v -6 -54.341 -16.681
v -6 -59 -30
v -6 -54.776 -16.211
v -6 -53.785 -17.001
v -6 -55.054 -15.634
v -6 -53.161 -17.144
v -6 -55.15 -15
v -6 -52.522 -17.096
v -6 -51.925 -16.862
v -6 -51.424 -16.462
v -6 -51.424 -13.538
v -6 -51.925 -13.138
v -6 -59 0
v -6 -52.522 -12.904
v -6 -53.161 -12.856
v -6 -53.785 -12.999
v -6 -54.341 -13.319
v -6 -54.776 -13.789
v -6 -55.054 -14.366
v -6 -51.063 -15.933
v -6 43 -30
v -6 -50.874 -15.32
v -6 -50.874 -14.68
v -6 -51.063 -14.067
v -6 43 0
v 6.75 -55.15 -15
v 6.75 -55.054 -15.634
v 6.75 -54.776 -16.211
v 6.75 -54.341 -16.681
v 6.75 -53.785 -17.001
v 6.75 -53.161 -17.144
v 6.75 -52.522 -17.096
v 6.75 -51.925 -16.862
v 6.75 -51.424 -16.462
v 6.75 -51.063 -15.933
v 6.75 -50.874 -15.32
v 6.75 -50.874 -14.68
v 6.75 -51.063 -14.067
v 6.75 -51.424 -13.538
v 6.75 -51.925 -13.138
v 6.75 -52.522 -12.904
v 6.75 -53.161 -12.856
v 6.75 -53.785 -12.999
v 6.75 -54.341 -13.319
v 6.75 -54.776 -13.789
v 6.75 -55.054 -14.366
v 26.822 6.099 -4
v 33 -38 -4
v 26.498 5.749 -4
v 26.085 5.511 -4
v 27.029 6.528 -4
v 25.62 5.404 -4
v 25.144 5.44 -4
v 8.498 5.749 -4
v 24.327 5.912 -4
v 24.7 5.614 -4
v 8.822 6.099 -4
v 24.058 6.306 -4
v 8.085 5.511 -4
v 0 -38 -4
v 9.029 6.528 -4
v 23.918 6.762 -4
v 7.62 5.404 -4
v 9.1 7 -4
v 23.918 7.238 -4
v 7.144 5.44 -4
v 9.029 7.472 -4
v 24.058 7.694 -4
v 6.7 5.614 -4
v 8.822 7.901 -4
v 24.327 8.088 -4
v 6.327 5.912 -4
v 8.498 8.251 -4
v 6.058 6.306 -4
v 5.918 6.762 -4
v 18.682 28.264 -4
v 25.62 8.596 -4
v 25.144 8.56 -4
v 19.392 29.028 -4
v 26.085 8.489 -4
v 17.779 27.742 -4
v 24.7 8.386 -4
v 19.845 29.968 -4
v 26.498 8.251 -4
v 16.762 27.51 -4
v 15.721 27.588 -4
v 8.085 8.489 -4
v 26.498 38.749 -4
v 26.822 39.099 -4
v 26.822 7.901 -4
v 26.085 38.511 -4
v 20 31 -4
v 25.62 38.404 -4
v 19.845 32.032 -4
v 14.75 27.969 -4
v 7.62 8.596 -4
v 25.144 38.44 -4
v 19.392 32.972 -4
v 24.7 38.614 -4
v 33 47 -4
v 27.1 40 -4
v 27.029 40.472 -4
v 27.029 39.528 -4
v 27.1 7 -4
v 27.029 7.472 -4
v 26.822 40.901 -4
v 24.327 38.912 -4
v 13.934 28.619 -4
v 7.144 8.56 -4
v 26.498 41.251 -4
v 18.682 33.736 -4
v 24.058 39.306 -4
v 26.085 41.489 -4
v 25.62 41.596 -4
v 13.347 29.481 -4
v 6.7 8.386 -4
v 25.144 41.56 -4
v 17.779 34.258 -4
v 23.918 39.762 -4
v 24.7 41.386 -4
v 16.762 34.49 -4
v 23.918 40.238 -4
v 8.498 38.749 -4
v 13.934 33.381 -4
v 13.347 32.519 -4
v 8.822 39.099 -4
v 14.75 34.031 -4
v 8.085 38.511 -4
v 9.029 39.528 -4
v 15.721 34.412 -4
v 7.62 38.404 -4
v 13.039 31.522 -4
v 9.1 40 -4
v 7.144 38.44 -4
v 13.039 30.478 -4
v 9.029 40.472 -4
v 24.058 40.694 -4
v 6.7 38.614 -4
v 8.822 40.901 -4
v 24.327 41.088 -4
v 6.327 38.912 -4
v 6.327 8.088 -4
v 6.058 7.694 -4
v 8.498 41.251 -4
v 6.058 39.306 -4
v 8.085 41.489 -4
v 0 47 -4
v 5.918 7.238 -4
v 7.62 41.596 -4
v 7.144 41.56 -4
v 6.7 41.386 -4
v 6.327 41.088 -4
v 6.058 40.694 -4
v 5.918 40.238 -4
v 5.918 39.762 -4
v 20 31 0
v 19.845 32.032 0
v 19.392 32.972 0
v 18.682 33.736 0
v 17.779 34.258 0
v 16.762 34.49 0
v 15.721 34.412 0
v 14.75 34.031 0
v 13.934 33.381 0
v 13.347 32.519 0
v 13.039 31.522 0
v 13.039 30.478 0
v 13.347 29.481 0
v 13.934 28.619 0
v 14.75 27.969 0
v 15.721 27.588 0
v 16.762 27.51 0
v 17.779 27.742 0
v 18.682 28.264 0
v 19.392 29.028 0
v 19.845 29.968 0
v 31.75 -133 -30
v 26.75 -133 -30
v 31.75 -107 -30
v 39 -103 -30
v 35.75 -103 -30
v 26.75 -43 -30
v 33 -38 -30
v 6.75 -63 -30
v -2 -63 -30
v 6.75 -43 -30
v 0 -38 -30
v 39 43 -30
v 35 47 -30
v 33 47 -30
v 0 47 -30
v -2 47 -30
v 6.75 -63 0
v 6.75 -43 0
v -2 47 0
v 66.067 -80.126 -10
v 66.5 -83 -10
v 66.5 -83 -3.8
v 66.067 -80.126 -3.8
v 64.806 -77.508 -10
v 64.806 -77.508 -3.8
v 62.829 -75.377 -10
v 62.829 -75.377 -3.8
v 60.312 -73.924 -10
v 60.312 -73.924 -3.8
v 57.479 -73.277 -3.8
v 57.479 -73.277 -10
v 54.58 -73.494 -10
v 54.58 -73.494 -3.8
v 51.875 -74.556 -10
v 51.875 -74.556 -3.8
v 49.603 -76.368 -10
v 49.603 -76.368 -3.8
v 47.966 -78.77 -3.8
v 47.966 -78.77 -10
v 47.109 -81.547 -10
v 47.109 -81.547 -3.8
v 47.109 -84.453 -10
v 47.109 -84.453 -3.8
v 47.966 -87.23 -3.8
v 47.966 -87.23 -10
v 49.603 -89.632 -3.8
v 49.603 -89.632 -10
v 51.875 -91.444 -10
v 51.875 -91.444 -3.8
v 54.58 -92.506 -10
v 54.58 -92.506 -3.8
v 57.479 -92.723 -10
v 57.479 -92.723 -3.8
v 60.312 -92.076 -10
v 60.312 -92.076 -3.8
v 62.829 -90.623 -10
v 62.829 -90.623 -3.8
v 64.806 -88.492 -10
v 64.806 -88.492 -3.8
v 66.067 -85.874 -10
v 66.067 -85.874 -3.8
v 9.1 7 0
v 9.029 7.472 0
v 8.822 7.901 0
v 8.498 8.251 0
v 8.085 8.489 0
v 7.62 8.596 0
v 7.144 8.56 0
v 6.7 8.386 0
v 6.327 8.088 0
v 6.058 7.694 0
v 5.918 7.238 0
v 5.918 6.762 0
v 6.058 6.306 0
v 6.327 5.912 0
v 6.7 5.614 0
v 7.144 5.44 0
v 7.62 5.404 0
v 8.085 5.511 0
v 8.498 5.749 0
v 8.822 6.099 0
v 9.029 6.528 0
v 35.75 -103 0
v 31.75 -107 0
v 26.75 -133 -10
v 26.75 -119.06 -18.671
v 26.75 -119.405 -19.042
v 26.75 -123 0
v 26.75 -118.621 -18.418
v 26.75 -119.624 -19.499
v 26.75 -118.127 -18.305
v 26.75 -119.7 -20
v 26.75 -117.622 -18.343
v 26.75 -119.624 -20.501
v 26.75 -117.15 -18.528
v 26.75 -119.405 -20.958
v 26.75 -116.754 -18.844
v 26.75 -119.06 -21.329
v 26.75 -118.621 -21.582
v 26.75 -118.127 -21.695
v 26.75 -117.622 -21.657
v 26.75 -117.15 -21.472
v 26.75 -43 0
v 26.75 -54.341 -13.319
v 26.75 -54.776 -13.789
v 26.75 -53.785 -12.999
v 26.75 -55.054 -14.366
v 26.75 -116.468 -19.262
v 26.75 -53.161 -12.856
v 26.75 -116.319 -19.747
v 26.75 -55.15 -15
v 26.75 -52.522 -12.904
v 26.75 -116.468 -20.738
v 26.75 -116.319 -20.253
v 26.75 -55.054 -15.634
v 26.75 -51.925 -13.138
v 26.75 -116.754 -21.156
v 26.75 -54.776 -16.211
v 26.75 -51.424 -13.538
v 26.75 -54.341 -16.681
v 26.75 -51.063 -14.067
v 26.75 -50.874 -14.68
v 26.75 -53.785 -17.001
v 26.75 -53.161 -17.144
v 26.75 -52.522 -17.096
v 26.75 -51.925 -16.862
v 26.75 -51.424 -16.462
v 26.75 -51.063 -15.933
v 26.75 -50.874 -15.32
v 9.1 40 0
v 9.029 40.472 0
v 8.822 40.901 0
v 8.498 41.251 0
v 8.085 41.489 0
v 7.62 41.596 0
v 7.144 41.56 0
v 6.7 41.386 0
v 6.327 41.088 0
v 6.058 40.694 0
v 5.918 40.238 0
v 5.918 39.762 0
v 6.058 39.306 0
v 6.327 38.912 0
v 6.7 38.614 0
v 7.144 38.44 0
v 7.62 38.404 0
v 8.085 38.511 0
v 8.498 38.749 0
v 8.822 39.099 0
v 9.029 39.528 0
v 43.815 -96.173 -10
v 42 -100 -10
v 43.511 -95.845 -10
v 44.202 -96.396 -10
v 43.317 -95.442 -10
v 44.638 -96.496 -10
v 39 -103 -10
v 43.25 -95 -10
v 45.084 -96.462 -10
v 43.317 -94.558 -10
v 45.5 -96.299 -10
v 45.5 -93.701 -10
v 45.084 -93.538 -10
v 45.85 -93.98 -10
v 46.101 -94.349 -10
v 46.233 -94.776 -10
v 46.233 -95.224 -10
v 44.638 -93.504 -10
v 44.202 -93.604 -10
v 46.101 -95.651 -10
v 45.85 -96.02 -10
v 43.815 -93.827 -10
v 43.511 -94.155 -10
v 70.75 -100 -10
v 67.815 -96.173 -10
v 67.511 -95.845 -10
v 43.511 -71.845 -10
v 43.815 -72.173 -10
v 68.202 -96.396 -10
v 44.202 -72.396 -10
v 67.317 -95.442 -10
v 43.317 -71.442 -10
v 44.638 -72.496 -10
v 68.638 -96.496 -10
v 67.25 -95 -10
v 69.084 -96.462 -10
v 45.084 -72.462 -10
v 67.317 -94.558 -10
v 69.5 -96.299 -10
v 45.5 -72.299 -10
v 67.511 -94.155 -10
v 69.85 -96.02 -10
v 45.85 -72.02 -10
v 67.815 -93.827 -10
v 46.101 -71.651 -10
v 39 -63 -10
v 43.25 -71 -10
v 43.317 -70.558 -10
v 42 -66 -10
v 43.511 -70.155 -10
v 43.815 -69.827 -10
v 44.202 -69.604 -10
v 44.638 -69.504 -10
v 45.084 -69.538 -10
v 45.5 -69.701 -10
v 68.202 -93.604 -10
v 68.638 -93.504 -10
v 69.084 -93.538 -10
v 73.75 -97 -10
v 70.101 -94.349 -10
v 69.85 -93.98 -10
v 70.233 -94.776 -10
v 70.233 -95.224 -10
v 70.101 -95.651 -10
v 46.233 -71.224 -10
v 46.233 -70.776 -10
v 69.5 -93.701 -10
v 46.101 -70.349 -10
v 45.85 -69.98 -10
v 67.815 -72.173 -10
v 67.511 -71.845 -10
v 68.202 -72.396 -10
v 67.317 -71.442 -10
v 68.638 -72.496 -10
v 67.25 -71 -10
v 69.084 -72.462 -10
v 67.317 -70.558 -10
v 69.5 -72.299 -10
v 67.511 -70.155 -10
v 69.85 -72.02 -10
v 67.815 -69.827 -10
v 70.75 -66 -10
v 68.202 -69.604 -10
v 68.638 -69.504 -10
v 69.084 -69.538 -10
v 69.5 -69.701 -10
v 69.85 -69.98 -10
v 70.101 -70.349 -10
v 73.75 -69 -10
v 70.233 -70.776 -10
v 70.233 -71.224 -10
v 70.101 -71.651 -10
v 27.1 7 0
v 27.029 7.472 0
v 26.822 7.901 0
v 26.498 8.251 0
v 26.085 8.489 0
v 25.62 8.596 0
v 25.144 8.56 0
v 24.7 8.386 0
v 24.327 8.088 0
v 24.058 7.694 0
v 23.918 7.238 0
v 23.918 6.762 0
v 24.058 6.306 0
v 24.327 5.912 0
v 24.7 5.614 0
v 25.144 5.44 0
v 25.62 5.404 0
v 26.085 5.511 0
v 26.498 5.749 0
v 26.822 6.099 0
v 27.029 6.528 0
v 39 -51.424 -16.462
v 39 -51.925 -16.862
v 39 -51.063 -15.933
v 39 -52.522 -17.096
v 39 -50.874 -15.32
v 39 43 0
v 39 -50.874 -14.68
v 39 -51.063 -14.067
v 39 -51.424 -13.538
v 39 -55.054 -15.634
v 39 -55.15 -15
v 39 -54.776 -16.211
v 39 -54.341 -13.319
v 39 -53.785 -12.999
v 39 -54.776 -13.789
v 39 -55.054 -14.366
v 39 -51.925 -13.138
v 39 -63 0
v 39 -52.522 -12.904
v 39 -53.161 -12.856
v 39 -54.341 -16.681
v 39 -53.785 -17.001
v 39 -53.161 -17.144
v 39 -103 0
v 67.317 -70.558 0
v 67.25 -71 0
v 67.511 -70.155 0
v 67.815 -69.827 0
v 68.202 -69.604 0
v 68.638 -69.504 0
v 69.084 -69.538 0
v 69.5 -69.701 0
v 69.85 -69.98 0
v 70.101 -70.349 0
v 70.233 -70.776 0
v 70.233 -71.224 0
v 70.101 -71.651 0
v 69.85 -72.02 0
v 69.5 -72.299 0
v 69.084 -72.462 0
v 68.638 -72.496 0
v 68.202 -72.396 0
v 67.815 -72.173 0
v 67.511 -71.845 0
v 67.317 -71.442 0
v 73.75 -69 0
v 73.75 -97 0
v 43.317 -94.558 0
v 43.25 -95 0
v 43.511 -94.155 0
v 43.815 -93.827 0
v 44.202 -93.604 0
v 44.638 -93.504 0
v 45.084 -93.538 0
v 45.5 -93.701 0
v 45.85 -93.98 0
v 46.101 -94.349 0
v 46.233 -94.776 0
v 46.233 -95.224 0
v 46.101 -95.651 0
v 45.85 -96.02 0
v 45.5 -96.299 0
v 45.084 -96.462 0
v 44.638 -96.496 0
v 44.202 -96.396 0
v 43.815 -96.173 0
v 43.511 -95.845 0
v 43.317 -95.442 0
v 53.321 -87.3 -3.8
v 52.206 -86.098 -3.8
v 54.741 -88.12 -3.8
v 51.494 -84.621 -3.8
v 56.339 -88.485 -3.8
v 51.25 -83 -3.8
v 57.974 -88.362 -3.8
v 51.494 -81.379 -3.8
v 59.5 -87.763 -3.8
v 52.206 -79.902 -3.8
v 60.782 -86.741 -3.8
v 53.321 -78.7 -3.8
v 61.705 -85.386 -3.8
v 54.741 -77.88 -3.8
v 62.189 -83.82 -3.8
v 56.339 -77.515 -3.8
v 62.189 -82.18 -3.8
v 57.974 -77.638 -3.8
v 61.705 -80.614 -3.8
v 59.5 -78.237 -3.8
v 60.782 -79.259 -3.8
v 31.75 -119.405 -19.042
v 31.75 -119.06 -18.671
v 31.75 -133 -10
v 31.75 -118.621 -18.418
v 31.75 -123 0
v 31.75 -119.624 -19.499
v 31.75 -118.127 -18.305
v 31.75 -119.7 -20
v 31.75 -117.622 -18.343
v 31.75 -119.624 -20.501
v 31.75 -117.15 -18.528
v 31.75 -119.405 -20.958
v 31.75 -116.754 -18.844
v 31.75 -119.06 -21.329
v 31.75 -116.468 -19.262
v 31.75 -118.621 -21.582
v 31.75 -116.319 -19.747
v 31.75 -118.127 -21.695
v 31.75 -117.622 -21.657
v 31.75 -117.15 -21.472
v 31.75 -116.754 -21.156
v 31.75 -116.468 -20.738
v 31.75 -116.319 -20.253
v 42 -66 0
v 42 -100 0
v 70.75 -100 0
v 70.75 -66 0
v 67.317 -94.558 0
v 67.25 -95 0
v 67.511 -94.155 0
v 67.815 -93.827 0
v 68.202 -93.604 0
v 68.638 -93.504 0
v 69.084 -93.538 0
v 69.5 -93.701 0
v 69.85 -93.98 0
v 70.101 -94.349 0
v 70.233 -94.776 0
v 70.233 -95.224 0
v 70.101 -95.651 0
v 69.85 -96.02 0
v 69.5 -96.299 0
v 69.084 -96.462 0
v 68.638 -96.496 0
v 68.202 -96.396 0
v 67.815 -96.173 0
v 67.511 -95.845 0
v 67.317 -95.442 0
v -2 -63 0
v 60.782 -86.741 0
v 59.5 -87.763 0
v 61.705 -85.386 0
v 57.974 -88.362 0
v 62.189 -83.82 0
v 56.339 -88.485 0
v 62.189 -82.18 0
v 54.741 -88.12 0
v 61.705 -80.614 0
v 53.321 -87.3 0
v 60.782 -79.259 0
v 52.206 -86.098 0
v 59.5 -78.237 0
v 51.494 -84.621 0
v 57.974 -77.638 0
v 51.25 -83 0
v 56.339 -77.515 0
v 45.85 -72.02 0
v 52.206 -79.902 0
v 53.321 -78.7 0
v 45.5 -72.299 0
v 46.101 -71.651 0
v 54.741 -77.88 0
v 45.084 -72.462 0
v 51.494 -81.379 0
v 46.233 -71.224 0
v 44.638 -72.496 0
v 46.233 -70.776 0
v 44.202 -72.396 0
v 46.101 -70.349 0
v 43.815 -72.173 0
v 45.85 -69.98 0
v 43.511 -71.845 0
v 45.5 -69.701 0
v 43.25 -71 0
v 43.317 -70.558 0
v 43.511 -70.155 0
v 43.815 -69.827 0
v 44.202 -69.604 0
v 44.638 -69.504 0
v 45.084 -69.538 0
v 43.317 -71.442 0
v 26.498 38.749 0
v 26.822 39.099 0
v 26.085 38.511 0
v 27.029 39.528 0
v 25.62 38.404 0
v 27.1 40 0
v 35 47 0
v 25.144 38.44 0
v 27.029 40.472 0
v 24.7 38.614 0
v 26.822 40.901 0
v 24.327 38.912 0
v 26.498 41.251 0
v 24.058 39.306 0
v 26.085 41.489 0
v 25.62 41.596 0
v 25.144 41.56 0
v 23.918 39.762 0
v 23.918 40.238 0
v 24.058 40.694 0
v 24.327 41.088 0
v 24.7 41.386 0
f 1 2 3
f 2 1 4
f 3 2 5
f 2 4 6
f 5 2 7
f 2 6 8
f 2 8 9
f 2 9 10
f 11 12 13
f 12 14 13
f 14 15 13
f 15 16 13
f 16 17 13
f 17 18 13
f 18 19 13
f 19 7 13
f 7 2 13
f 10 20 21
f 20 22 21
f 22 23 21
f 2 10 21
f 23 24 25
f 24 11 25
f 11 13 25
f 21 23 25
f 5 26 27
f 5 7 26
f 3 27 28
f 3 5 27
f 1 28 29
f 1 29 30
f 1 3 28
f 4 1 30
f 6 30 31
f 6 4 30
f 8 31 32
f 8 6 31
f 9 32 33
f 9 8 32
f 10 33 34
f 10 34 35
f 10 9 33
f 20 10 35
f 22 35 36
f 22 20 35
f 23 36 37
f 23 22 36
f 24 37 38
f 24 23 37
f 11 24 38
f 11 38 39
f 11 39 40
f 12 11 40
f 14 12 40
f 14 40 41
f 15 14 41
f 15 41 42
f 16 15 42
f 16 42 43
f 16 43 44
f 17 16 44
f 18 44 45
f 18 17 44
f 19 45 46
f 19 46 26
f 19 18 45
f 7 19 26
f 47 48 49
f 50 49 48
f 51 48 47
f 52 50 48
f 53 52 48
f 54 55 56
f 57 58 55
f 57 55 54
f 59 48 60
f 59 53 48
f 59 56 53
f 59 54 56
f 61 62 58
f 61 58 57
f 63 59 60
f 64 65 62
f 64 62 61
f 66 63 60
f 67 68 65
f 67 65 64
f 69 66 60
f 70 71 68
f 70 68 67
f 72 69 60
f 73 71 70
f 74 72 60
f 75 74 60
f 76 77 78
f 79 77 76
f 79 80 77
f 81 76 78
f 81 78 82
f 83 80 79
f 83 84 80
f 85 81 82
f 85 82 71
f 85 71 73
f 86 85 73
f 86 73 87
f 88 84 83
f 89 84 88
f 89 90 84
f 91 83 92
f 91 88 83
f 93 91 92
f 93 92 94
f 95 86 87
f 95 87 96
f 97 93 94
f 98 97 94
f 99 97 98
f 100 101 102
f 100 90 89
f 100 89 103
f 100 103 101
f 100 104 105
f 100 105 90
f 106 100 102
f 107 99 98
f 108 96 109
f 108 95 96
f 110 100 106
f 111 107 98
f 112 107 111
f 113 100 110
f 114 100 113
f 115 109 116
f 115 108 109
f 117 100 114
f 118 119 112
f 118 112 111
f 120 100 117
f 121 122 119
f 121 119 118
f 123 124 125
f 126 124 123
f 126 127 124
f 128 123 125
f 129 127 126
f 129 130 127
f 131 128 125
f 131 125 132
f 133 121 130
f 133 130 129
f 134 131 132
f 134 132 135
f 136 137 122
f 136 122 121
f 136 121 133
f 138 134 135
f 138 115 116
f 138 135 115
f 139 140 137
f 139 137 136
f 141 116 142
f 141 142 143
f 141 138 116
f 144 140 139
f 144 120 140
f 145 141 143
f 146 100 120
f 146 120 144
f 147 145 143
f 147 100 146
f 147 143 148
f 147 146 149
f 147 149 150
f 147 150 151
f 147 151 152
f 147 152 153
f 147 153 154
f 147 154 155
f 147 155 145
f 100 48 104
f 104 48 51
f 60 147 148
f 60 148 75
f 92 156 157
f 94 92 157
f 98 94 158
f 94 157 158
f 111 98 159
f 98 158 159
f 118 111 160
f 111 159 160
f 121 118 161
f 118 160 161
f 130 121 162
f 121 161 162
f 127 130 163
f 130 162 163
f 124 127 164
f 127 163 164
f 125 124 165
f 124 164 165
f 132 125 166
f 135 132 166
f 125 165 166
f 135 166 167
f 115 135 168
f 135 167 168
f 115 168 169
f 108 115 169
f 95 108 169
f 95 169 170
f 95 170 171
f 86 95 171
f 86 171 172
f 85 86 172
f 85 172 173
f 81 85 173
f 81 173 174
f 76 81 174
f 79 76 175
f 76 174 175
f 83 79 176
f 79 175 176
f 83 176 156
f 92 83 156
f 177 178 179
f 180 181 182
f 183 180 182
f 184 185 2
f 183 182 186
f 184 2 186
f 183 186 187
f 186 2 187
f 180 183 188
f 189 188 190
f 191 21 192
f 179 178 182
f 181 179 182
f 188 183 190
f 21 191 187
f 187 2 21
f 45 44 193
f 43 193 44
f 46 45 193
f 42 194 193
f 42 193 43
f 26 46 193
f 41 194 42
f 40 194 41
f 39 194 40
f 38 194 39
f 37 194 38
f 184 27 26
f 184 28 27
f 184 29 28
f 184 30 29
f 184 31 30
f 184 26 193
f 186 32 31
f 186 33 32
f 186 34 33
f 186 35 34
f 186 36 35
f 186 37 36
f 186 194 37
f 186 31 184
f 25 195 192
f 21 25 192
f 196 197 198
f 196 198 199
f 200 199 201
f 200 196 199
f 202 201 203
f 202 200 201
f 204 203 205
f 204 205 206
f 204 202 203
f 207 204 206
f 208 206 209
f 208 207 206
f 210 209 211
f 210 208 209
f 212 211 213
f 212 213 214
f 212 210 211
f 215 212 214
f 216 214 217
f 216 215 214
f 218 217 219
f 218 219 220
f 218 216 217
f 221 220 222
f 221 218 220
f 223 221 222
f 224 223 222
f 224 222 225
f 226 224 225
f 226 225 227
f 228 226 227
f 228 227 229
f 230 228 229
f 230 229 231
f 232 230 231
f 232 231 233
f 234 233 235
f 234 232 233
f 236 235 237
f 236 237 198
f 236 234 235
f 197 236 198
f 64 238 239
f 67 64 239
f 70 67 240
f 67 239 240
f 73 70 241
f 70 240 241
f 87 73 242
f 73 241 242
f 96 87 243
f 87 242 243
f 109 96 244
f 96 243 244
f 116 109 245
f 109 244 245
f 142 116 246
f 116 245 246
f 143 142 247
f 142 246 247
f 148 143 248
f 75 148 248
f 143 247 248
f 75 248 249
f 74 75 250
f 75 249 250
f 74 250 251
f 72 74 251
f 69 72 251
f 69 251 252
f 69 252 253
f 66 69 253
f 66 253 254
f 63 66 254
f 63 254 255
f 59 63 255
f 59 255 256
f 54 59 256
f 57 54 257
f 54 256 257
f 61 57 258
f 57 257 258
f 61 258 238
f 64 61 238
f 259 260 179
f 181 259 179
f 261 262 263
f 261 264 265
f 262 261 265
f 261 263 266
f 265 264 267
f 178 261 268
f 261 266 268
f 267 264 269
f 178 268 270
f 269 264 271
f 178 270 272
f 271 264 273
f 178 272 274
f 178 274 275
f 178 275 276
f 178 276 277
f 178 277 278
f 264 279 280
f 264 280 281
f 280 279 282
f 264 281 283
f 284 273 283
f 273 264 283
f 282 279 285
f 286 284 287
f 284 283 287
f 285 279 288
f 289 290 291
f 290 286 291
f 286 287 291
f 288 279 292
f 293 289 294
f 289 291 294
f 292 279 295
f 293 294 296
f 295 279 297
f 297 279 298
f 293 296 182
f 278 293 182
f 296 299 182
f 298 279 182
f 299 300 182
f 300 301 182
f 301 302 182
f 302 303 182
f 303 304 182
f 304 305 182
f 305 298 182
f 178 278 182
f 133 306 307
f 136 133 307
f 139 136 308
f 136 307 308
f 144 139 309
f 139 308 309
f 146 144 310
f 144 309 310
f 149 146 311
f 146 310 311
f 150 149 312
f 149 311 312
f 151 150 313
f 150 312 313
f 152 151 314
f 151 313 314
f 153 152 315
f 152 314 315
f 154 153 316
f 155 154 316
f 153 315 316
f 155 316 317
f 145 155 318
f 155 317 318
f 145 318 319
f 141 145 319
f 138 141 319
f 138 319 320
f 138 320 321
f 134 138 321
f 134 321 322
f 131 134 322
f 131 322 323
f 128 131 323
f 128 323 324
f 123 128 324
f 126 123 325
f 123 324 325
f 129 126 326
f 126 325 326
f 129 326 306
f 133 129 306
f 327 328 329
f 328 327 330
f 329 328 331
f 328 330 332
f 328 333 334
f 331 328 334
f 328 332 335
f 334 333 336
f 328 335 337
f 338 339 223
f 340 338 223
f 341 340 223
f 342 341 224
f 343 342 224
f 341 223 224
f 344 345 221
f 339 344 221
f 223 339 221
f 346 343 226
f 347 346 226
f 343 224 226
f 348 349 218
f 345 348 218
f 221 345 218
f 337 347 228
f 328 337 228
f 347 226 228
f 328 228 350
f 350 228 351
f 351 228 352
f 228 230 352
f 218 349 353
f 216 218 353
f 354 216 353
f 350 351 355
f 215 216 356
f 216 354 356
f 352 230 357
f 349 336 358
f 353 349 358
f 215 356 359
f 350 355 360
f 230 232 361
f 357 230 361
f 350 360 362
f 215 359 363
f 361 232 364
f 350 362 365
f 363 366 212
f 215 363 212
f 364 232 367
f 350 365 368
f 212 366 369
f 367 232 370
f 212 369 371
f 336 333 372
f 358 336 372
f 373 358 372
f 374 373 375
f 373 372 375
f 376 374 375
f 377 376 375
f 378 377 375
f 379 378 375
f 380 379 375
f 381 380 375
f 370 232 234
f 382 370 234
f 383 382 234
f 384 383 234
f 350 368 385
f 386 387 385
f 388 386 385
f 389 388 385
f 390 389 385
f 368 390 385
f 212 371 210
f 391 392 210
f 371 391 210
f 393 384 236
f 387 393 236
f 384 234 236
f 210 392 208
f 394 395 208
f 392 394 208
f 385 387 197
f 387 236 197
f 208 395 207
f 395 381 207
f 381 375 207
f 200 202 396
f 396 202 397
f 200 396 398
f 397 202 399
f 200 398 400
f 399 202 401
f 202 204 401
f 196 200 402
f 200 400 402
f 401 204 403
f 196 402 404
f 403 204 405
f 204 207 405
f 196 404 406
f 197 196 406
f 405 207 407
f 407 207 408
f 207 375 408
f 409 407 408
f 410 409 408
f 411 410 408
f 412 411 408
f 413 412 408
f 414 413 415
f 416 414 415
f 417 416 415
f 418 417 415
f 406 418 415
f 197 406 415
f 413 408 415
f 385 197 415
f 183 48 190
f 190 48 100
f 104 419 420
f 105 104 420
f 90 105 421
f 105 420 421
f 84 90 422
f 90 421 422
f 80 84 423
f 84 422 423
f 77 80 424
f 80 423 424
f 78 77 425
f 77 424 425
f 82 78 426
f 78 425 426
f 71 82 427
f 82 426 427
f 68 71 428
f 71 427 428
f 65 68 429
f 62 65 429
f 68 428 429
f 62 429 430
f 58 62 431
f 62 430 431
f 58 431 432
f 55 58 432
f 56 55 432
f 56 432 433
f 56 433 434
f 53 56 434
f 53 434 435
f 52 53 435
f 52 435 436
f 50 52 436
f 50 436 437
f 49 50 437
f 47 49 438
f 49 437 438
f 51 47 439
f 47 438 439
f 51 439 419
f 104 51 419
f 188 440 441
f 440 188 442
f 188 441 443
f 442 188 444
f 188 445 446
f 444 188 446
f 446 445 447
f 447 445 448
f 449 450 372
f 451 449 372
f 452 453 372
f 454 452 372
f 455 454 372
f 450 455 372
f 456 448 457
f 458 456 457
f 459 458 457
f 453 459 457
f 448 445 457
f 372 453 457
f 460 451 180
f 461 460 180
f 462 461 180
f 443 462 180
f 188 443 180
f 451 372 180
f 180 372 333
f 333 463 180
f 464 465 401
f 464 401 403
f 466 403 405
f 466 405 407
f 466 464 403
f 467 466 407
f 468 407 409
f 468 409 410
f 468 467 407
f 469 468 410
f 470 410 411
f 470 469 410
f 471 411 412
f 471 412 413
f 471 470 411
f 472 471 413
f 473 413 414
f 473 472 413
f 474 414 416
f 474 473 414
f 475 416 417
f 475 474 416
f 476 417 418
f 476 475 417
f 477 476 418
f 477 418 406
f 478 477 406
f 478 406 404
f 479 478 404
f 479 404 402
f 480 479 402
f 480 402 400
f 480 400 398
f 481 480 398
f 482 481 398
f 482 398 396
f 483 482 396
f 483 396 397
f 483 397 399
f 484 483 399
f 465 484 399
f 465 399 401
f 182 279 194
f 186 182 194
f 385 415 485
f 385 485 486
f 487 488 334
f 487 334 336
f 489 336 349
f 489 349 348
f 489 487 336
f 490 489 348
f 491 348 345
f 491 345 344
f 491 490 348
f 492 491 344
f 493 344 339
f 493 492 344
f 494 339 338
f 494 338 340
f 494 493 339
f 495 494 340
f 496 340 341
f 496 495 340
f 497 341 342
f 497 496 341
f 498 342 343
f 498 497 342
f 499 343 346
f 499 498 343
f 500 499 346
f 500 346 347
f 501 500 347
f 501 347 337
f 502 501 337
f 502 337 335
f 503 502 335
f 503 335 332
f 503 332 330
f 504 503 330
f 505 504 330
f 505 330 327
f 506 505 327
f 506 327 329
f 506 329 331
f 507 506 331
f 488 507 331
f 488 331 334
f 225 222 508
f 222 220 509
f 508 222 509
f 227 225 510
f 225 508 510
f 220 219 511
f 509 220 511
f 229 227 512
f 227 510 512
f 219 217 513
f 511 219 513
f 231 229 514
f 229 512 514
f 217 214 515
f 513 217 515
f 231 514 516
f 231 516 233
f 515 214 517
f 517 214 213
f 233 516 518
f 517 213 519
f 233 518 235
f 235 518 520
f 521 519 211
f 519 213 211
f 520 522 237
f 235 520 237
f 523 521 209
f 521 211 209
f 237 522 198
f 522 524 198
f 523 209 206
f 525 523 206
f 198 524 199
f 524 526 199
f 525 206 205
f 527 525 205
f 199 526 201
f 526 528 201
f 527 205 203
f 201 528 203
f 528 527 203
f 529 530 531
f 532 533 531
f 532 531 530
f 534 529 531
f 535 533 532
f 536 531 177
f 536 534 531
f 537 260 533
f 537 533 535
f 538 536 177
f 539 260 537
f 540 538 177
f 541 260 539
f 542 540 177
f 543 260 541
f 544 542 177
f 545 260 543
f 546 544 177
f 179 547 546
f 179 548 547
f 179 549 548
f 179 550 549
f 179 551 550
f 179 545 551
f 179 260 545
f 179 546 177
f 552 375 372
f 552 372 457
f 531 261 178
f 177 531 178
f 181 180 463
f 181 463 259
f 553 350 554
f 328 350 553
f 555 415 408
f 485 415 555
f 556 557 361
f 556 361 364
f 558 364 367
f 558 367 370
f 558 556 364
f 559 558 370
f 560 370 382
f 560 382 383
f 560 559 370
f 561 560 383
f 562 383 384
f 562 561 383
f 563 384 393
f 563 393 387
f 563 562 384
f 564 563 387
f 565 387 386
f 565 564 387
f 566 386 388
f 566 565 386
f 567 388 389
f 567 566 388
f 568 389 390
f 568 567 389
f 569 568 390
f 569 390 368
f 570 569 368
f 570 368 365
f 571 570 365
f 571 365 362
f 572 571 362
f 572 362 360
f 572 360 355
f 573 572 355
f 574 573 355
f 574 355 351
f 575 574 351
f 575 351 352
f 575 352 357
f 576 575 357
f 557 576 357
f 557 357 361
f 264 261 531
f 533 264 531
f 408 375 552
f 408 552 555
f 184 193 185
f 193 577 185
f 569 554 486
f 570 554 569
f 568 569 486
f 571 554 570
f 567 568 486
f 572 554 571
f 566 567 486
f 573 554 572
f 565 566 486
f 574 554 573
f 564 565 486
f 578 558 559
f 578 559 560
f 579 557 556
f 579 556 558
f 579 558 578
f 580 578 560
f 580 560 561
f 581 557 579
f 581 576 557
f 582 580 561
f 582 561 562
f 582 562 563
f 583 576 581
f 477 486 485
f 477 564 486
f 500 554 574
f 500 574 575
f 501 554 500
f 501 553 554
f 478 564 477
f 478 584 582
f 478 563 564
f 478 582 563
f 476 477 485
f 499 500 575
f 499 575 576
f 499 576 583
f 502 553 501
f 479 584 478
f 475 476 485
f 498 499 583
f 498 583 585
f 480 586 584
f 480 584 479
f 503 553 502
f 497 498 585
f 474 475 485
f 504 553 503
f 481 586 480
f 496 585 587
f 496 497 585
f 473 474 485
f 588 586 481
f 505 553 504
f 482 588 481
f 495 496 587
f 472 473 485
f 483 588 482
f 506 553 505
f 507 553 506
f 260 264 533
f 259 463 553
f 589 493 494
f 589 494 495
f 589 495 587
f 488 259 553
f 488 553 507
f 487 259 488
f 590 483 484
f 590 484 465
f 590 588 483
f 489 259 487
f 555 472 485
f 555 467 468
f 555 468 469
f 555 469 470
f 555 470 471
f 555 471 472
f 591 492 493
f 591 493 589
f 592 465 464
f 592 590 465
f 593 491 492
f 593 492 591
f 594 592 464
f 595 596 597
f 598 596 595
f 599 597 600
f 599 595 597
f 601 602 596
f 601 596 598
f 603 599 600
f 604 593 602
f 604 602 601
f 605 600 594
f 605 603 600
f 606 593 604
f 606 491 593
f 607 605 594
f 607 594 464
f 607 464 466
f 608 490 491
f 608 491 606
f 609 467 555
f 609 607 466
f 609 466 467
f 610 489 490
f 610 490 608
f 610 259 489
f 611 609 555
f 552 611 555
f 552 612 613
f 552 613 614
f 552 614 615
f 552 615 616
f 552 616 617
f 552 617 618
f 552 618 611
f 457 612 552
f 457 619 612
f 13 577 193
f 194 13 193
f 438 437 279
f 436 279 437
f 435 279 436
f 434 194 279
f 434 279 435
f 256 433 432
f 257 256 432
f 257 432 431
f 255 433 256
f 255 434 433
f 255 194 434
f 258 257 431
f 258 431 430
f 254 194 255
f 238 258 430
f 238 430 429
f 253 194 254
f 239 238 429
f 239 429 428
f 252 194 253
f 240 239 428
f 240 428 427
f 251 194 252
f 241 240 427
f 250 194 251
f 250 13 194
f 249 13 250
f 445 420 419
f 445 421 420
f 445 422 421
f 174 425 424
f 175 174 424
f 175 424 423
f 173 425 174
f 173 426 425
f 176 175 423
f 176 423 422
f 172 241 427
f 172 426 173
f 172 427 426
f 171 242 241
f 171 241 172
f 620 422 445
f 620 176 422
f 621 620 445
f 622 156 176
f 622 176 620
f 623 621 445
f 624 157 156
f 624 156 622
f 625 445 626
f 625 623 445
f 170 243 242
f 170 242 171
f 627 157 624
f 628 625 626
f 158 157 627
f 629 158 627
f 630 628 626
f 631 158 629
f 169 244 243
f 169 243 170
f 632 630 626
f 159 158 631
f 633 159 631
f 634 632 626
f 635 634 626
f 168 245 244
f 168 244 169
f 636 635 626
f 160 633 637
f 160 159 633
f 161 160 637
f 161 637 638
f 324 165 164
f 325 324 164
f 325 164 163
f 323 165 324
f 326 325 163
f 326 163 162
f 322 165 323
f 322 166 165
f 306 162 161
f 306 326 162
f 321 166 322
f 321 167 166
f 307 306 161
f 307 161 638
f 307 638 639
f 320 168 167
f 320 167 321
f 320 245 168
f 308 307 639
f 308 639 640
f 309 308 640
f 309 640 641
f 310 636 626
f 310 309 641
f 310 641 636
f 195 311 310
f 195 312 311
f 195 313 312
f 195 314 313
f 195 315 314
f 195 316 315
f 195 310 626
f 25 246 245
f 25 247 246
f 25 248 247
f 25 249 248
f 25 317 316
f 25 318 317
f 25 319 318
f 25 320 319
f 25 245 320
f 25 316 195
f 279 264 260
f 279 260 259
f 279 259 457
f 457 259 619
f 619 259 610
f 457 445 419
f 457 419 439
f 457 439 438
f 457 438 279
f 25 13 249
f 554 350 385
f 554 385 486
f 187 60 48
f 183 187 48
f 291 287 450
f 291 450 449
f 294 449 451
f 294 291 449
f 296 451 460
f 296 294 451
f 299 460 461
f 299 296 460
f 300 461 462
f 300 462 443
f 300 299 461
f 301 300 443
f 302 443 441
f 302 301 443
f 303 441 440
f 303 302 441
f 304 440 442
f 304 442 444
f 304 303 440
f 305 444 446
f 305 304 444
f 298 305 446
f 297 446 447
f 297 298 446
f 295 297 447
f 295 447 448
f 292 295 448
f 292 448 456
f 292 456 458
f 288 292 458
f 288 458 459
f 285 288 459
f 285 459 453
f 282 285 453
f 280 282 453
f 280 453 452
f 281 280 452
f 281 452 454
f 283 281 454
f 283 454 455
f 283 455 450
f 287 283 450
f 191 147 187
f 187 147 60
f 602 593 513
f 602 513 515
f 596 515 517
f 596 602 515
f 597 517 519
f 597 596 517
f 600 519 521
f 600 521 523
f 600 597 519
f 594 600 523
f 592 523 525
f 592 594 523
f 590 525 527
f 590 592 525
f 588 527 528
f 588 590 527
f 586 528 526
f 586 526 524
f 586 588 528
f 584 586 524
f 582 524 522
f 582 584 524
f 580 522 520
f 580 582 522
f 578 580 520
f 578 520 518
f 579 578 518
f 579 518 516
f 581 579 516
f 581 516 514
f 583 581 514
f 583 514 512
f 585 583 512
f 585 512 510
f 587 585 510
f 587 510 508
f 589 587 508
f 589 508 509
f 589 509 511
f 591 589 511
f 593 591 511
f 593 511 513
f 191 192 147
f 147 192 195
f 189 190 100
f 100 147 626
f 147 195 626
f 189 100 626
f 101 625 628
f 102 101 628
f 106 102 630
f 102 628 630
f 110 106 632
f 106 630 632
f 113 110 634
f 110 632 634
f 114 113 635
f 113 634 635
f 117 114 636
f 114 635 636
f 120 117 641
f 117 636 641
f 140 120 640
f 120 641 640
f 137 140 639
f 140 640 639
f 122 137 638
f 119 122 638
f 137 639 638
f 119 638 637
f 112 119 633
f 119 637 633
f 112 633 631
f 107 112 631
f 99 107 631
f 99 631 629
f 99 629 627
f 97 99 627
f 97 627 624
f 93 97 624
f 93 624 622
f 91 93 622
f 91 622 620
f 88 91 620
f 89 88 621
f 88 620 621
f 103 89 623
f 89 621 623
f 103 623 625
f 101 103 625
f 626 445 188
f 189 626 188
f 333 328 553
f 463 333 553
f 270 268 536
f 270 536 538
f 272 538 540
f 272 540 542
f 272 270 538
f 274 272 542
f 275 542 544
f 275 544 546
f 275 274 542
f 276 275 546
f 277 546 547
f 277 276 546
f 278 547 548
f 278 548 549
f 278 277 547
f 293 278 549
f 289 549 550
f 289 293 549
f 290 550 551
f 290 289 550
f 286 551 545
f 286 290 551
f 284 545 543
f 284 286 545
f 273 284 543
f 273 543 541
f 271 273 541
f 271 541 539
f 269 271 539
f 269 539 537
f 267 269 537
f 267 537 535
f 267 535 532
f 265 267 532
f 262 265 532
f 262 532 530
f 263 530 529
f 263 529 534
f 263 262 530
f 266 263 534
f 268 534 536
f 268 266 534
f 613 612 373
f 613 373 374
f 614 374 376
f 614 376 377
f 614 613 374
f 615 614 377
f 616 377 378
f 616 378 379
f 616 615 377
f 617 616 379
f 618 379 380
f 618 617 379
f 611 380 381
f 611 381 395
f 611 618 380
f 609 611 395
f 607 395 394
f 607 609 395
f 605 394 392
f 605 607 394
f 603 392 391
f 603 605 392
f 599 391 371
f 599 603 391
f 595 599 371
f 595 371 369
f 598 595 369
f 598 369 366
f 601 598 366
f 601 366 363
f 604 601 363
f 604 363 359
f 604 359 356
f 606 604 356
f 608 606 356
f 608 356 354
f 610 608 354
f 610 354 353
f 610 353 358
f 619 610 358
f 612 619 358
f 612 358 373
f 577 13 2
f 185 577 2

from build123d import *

# Parameters (mm, degrees)
SKETCH_1_W               = 33
SKETCH_1_H               = 47
SKETCH_1_R               = 1.6
SKETCH_1_R_2             = 3.5
EXTRUDE_1_DEPTH          = 4
EXTRUDE_2_DEPTH          = 30
EXTRUDE_START            = -4
SKETCH_4_W               = 33
SKETCH_4_H               = 38
EXTRUDE_3_DEPTH          = 4
SKETCH_6_W               = 50
SKETCH_6_H               = 40
SKETCH_6_R               = 5.5
SKETCH_6_R_2             = 1.5
EXTRUDE_4_DEPTH          = 30
SKETCH_7_W               = 37.75
SKETCH_7_H               = 40
CUT_EXTRUDE_1_DEPTH      = 20
SKETCH_8_R               = 9.75
CUT_EXTRUDE_2_DEPTH      = 6.2
SKETCH_10_R              = 2.15
CUT_EXTRUDE_4_DEPTH      = 136.486392306
SKETCH_11_W              = 30
SKETCH_11_H              = 30
SKETCH_11_R              = 1.7
EXTRUDE_5_DEPTH          = 5
CUT_EXTRUDE_5_DEPTH      = 20
CHAMFER_1_SIZE           = 4
CHAMFER_2_SIZE           = 3
CHAMFER_3_SIZE           = 10
CUT_EXTRUDE_6_DEPTH      = 164.487193688
CUT_EXTRUDE_6_DEPTH_BACK = 30
SKETCH_13_W              = 132.923896649
SKETCH_13_H              = 188.96680941
SKETCH_14_W              = 30
SKETCH_14_H              = 20
SKETCH_14_R              = 2.15
EXTRUDE_6_DEPTH          = 0.5


with BuildPart() as part:
    # 草图1 → 凸台-拉伸1 (new body)
    with BuildSketch(Plane.XY):
        with Locations((16.5, 23.5)):
            Rectangle(SKETCH_1_W, SKETCH_1_H)
        with Locations((7.5, 40)):
            Circle(SKETCH_1_R, mode=Mode.SUBTRACT)
        with Locations((25.5, 40)):
            Circle(SKETCH_1_R, mode=Mode.SUBTRACT)
        with Locations((7.5, 7)):
            Circle(SKETCH_1_R, mode=Mode.SUBTRACT)
        with Locations((25.5, 7)):
            Circle(SKETCH_1_R, mode=Mode.SUBTRACT)
        with Locations((16.5, 31)):
            Circle(SKETCH_1_R_2, mode=Mode.SUBTRACT)
    extrude(amount=EXTRUDE_1_DEPTH)

    # 草图3 → 凸台-拉伸2 (add)
    with BuildSketch(Plane(origin=(0, 0, 0), x_dir=(-1, 0, 0), z_dir=(0, 0, -1))):
        Polygon((0, -38), (-33, -38), (-33, 47), (-39, 47), (-39, -63), (-26.75, -63), (-26.75, -43), (-6.25, -43), (-6.25, -63), (6, -63), (6, 47), (0, 47), align=None)
    extrude(amount=-EXTRUDE_2_DEPTH)

    # 草图4 → 凸台-拉伸3 (add)
    with BuildSketch(Plane(origin=(0, 0, 0), x_dir=(-1, 0, 0), z_dir=(0, 0, -1)).offset(EXTRUDE_START)):
        with Locations((-16.5, -19)):
            Rectangle(SKETCH_4_W, SKETCH_4_H)
    extrude(amount=EXTRUDE_3_DEPTH)

    # 草图6 → 凸台-拉伸4 (add, through all)
    with BuildSketch(Plane(origin=(0, 0, 0), x_dir=(-1, 0, 0), z_dir=(0, 0, -1))):
        with Locations((-51.75, -83)):
            Rectangle(SKETCH_6_W, SKETCH_6_H)
        with Locations((-56.75, -83)):
            Circle(SKETCH_6_R, mode=Mode.SUBTRACT)
        with Locations((-68.75, -95)):
            Circle(SKETCH_6_R_2, mode=Mode.SUBTRACT)
        with Locations((-68.75, -71)):
            Circle(SKETCH_6_R_2, mode=Mode.SUBTRACT)
        with Locations((-44.75, -95)):
            Circle(SKETCH_6_R_2, mode=Mode.SUBTRACT)
        with Locations((-44.75, -71)):
            Circle(SKETCH_6_R_2, mode=Mode.SUBTRACT)
    extrude(amount=-EXTRUDE_4_DEPTH)

    # 草图7 → 切除-拉伸1 (cut)
    with BuildSketch(Plane.XY.offset(30)):
        with Locations((57.875, -83)):
            Rectangle(SKETCH_7_W, SKETCH_7_H)
    extrude(amount=-CUT_EXTRUDE_1_DEPTH, mode=Mode.SUBTRACT)

    # 草图8 → 切除-拉伸2 (cut)
    with BuildSketch(Plane.XY.offset(10)):
        with Locations((56.75, -83)):
            Circle(SKETCH_8_R)
    extrude(amount=-CUT_EXTRUDE_2_DEPTH, mode=Mode.SUBTRACT)

    # 草图10 → 切除-拉伸4 (cut, through all)
    with BuildSketch(Plane.ZY.offset(6)):
        with Locations(Location((15, -53, 0), (0, 0, 270))):
            Circle(SKETCH_10_R)
    extrude(amount=-CUT_EXTRUDE_4_DEPTH, mode=Mode.SUBTRACT)

    # 草图11 → 凸台-拉伸5 (add)
    with BuildSketch(Plane.ZY.offset(-26.75)):
        with Locations((15, -118)):
            Rectangle(SKETCH_11_W, SKETCH_11_H)
        with Locations(Location((20, -118, 0), (0, 0, 270))):
            Circle(SKETCH_11_R, mode=Mode.SUBTRACT)
    extrude(amount=-EXTRUDE_5_DEPTH)

    # 草图12 → 切除-拉伸5 (cut)
    with BuildSketch(Plane.XY.offset(10)):
        Polygon((39, -103), (76.75, -103), (76.75, -63), (39, -63), (39, -66), (73.75, -66), (73.75, -100), (39, -100), align=None)
    extrude(amount=-CUT_EXTRUDE_5_DEPTH, mode=Mode.SUBTRACT)

    # 倒角1
    chamfer_1_edges = [part.edges().sort_by_distance(p)[0] for p in [
        (31.75, -103, 15),
        (-6, 47, 15),
        (-6, -63, 15),
        (39, 47, 15),
    ]]
    chamfer(chamfer_1_edges, length=CHAMFER_1_SIZE)

    # 倒角2
    chamfer_2_edges = [part.edges().sort_by_distance(p)[0] for p in [
        (39, -100, 5),
        (39, -66, 5),
    ]]
    chamfer(chamfer_2_edges, length=CHAMFER_2_SIZE - 0.0001)  # a hair under: the kernel refuses the full size
    chamfer_2_2_edges = [part.edges().sort_by_distance(p)[0] for p in [
        (73.75, -100, 5),
        (73.75, -66, 5),
    ]]
    chamfer(chamfer_2_2_edges, length=CHAMFER_2_SIZE)

    # 倒角3
    chamfer_3_edges = [part.edges().sort_by_distance(p)[0] for p in [
        (29.25, -133, 0),
    ]]
    chamfer(chamfer_3_edges, length=CHAMFER_3_SIZE)


with BuildPart() as body_2:
    # 镜向1: mirrored copy
    add(part.part.mirror(Plane(origin=(0, 0, 0), x_dir=(1, 0, 0), z_dir=(0, 0, -1))))

    # 草图14 → 凸台-拉伸6 (add)
    with BuildSketch(Plane(origin=(6.25, 0, 0), x_dir=(0, 0, -1), z_dir=(1, 0, 0))):
        with Locations((15, -53)):
            Rectangle(SKETCH_14_W, SKETCH_14_H)
        with Locations(Location((15, -53, 0), (0, 0, 270))):
            Circle(SKETCH_14_R, mode=Mode.SUBTRACT)
    extrude(amount=EXTRUDE_6_DEPTH)


with BuildPart() as part_1:
    add(part.part)

    # 草图13 → 切除-拉伸6 (cut, two sides: drawn at the far end of the back side and taken through both)
    with BuildSketch(Plane.XY.offset(30).offset(-CUT_EXTRUDE_6_DEPTH_BACK)):
        with Locations((27.793899124, -40.302373562)):
            Rectangle(SKETCH_13_W, SKETCH_13_H)
    extrude(amount=CUT_EXTRUDE_6_DEPTH + CUT_EXTRUDE_6_DEPTH_BACK, mode=Mode.SUBTRACT)


solid = body_2.part
